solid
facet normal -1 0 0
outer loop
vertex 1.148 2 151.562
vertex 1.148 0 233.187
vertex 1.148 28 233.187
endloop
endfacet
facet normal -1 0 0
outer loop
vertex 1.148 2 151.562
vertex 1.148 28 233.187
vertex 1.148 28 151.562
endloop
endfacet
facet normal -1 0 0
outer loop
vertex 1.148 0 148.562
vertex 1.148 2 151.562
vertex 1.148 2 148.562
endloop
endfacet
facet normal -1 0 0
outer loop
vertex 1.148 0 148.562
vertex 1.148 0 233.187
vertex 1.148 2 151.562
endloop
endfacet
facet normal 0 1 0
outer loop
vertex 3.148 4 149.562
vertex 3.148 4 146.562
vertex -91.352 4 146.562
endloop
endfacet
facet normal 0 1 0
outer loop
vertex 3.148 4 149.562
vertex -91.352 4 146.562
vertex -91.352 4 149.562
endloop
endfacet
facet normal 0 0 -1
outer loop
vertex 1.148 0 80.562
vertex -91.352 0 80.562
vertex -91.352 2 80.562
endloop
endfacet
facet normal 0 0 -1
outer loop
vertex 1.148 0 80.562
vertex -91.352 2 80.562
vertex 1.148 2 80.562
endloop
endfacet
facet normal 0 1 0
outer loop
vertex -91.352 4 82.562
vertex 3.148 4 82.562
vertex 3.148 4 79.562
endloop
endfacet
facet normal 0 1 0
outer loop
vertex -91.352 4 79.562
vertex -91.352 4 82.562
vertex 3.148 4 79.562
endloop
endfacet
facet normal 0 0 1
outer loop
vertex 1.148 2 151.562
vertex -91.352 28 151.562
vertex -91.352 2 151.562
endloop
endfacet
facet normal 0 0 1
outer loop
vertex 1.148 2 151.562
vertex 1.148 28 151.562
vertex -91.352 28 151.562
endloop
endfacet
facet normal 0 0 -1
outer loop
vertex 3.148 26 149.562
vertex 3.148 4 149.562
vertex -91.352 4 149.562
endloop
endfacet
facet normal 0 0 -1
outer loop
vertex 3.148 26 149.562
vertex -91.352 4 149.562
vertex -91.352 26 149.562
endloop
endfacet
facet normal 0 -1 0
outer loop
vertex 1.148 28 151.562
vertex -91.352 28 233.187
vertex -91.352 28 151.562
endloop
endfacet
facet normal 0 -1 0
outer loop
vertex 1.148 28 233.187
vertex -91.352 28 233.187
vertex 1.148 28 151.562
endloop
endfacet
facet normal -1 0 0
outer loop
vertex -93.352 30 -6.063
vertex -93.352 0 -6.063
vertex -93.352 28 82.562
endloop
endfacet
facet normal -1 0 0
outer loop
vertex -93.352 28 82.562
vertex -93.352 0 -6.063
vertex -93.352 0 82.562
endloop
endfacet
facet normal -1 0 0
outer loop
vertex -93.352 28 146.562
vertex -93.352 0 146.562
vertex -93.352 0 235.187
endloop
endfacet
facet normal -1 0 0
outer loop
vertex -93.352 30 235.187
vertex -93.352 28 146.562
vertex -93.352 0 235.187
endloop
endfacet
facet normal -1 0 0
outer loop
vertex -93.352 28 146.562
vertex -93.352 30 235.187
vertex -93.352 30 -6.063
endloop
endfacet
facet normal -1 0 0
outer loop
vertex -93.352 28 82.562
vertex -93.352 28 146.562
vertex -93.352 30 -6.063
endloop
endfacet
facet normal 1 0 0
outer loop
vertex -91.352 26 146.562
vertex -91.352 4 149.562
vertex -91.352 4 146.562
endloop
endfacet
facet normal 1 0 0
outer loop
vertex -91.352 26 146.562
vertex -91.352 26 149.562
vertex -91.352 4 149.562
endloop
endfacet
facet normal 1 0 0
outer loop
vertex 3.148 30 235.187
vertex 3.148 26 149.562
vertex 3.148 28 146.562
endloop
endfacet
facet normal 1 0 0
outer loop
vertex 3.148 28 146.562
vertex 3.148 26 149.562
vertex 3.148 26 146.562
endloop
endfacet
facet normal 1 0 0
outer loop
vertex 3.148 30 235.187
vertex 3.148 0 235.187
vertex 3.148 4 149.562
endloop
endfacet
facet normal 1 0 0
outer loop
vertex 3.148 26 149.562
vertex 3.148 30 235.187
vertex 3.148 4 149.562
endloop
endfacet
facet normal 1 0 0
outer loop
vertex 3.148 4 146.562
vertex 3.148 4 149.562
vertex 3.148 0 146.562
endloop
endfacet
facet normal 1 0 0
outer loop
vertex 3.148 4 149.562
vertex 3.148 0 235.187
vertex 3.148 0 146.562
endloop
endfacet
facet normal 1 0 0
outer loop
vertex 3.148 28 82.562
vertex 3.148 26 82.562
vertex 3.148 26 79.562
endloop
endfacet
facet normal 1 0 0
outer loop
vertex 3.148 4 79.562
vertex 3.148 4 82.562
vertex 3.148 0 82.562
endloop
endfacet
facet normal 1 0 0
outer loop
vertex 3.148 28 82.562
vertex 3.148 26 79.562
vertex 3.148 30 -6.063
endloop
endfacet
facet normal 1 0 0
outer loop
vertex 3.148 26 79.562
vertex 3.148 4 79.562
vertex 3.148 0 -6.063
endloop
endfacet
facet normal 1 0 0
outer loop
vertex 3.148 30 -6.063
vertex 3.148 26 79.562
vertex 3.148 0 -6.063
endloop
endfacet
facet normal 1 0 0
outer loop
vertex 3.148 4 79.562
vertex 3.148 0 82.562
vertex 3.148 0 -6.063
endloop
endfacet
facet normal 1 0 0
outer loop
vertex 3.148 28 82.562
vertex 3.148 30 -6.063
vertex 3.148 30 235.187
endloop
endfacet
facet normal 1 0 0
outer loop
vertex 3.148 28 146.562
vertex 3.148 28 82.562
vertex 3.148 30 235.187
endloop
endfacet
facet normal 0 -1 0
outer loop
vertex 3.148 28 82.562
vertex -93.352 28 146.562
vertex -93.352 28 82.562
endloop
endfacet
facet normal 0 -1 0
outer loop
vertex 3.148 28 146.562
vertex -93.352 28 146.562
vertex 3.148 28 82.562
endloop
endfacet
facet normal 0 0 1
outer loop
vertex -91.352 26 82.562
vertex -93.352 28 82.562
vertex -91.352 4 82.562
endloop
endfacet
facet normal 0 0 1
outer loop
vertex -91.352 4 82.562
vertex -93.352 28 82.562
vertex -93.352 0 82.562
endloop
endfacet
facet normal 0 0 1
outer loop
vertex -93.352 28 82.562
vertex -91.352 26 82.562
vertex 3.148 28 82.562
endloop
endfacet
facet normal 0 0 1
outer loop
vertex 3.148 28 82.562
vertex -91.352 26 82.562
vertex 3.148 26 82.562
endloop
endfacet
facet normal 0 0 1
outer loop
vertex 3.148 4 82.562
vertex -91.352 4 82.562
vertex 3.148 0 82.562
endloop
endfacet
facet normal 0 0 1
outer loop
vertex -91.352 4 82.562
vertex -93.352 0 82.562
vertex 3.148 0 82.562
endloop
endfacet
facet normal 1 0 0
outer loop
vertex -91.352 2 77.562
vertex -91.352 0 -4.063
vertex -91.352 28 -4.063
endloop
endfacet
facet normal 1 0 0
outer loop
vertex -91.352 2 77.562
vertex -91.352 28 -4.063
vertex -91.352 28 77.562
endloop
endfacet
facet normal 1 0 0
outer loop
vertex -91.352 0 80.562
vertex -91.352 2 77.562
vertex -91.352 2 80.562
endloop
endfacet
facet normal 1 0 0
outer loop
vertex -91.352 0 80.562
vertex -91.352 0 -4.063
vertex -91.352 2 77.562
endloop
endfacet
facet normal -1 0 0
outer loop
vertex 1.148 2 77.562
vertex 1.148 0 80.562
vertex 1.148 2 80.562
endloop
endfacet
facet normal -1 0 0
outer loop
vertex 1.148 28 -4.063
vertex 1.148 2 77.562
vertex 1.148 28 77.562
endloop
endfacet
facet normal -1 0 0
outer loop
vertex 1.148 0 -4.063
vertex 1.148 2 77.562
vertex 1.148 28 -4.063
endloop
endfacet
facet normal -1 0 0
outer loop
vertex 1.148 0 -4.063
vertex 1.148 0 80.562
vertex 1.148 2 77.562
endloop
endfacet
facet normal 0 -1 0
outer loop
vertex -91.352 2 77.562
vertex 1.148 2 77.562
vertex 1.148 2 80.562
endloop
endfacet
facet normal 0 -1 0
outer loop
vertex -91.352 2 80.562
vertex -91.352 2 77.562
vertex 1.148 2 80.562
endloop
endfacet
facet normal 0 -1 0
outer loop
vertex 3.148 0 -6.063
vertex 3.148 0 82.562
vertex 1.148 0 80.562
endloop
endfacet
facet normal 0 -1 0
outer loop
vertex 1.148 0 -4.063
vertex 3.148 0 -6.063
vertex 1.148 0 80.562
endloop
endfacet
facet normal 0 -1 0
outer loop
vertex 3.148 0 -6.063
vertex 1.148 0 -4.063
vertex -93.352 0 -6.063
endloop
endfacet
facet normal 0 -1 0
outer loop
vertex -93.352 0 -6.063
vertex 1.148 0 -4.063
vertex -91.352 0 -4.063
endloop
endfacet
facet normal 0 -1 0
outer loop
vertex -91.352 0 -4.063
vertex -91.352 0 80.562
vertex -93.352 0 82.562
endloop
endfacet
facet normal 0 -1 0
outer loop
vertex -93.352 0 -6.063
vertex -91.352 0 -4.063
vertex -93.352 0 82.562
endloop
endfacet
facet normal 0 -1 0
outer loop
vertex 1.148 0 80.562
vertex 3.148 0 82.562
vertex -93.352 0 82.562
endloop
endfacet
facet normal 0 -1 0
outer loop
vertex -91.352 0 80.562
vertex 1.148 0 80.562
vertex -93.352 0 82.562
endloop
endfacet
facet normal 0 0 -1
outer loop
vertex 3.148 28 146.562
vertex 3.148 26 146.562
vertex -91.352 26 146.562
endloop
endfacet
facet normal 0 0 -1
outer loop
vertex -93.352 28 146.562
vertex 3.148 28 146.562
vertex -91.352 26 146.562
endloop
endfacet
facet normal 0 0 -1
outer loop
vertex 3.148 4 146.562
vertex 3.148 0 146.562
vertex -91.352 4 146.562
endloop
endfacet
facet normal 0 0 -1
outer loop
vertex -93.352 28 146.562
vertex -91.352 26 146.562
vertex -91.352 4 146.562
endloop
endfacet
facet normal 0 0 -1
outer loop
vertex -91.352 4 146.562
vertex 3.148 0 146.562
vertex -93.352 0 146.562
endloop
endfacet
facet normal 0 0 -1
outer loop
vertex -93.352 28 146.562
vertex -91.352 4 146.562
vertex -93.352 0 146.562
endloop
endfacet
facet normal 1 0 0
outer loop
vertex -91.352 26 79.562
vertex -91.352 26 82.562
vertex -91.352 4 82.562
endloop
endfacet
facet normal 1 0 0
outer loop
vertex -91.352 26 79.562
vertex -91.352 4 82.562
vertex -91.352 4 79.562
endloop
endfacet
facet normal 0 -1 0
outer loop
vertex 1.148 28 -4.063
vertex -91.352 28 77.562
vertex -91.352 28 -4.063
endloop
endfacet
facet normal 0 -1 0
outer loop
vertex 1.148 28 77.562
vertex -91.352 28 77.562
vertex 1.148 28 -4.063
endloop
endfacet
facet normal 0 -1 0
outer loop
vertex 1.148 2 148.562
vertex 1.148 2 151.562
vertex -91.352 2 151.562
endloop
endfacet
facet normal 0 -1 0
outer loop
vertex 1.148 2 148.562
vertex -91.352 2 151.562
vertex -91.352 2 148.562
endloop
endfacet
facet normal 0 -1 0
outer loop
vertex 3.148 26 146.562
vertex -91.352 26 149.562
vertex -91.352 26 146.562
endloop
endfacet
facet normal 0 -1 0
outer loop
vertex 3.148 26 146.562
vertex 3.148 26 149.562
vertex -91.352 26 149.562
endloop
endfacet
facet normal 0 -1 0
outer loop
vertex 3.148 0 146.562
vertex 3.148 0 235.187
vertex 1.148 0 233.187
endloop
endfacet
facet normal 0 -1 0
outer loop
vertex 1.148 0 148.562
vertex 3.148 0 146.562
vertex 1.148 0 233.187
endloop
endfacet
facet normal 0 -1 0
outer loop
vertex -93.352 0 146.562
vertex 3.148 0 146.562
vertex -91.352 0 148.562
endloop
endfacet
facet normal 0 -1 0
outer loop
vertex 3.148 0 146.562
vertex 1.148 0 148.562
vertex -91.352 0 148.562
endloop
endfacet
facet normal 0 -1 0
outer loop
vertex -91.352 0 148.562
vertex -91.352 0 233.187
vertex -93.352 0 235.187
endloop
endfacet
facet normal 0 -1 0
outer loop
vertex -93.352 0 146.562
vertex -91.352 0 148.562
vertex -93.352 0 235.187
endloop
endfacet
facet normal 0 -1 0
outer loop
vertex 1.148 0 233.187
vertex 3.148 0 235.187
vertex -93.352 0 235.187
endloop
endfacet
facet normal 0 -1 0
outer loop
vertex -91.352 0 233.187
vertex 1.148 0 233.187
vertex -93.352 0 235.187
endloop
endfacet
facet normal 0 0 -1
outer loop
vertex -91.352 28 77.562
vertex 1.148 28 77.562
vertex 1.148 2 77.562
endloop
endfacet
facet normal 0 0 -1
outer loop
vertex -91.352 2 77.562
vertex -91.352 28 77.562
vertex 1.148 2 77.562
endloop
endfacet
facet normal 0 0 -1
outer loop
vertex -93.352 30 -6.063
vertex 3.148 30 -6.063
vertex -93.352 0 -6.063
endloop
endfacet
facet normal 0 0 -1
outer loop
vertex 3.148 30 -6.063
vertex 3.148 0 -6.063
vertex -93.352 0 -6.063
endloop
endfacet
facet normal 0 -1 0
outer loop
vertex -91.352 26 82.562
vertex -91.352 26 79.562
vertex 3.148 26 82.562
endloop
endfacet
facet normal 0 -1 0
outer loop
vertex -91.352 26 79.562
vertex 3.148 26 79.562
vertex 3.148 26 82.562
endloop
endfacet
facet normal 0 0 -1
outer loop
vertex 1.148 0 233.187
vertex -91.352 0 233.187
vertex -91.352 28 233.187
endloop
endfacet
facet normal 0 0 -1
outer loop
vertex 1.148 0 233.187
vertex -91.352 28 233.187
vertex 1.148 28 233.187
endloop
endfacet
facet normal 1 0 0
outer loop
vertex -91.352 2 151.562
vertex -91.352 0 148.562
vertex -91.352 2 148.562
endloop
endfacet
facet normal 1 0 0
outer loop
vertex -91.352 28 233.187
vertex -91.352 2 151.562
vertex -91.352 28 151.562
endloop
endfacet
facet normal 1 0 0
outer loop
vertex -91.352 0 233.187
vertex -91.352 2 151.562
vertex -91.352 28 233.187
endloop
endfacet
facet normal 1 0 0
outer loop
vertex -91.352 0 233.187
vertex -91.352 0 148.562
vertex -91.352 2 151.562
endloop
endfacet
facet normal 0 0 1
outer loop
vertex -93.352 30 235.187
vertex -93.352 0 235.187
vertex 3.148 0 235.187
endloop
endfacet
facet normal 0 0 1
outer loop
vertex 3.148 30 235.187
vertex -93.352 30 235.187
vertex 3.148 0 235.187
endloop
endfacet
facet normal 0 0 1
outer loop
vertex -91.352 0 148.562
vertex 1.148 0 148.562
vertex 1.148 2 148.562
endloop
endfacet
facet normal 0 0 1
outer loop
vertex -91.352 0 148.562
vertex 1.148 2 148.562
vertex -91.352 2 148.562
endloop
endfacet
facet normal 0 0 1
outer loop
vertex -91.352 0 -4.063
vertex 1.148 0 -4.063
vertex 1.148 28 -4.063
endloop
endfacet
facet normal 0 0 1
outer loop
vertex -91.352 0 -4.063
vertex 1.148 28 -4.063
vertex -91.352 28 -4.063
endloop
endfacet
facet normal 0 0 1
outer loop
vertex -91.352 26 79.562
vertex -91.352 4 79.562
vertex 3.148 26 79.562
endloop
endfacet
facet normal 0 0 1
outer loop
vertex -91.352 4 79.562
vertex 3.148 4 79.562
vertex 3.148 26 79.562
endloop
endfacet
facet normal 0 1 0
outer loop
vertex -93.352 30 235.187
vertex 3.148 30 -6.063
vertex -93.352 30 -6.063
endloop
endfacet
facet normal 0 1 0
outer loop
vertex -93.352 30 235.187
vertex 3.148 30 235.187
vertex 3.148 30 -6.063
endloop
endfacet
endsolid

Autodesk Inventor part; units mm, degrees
sketch "Sketch1" plane through (0, 0, 0) normal (0, 1, 0) x (-1, 0, 0)
  point P0 (0, 0)
sketch "Sketch2" plane through (0, 0, 0) normal (0, 1, 0) x (-1, 0, 0)
  point P0 (0, 0)
sketch "Sketch3" plane through (0, 0, 0) normal (0, 1, 0) x (-1, 0, 0)
  line L0 (93.3518, 235.1866) -> (-3.1482, 235.1866)
  line L1 (-3.1482, 235.1866) -> (-3.1482, -6.0634)
  line L2 (-3.1482, -6.0634) -> (93.3518, -6.0634)
  line L3 (93.3518, -6.0634) -> (93.3518, 235.1866)
  point P0 (0, 0)
  dimension "d0" = 241.25
  dimension "d1" = 96.5
extrude "Extrusion1" add sketch "Sketch3" along normal blind 30
sketch "Sketch4" plane through (0, 0, 0) normal (0, -1, 0) x (1, 0, 0)
  line L0 (-93.3518, -6.0634) -> (-93.3518, 235.1866) projected
  line L1 (-93.3518, 82.5616) -> (3.1482, 82.5616)
  line L2 (3.1482, 82.5616) -> (3.1482, 146.5616)
  line L3 (3.1482, 146.5616) -> (-93.3518, 146.5616)
  line L4 (-93.3518, 146.5616) -> (-93.3518, 82.5616)
  point P0 (0, 0)
  point P1 (-93.3518, 114.5616)
  point P2 (-93.3518, 114.5616)
  dimension "d4" = 64
  dimension "d5" = 0
  dimension "d6" = 96.5
  dimension "d7" = 0
extrude "Extrusion2" cut sketch "Sketch4" against normal blind 28
sketch "Sketch5" plane through (0, 0, 0) normal (0, -1, 0) x (1, 0, 0)
  line L0 (3.1482, 82.5616) -> (-93.3518, 82.5616) projected
  line L1 (-93.3518, -6.0634) -> (-93.3518, 82.5616) projected
  line L2 (3.1482, -6.0634) -> (-93.3518, -6.0634) projected
  line L3 (3.1482, 82.5616) -> (3.1482, -6.0634) projected
  line L4 (-93.3518, 146.5616) -> (3.1482, 146.5616) projected
  line L5 (3.1482, 235.1866) -> (3.1482, 146.5616) projected
  line L6 (-93.3518, 235.1866) -> (3.1482, 235.1866) projected
  line L7 (-93.3518, 146.5616) -> (-93.3518, 235.1866) projected
  line L8 (-91.3518, 80.5616) -> (1.1482, 80.5616)
  line L9 (1.1482, 80.5616) -> (1.1482, -4.0634)
  line L10 (1.1482, -4.0634) -> (-91.3518, -4.0634)
  line L11 (-91.3518, -4.0634) -> (-91.3518, 80.5616)
  line L12 (-91.3518, 233.1866) -> (1.1482, 233.1866)
  line L13 (1.1482, 233.1866) -> (1.1482, 148.5616)
  line L14 (1.1482, 148.5616) -> (-91.3518, 148.5616)
  line L15 (-91.3518, 148.5616) -> (-91.3518, 233.1866)
  point P0 (0, 0)
  dimension "d10" = 2
  dimension "d11" = 2
extrude "Extrusion3" cut sketch "Sketch5" against normal blind 28 contours L8 L9 L10 L11 | L12 L13 L14 L15
sketch "Sketch6" plane through (-93.3518, 0, 235.1866) normal (-1, 0, 0) x (0, 0, 1)
  point P0 (-235.1866, 0)
  point P1 (-196.9375, 14)
sketch "Sketch7" plane through (-91.3518, 0, 148.5616) normal (0, 0, 1) x (1, 0, 0)
  line L0 (92.5, 0) -> (0, 0) projected
  line L1 (92.5, 0) -> (92.5, 28) projected
  line L2 (92.5, 28) -> (0, 28) projected
  line L3 (0, 0) -> (0, 28) projected
  point P0 (91.3518, 0)
sketch "Sketch9" plane through (3.1482, 0, -6.0634) normal (1, 0, 0) x (0, 0, -1)
  line L0 (-152.625, 28) -> (-152.625, 26)
  line L1 (-152.625, 0) -> (-152.625, 28) projected
  line L2 (-152.625, 0) -> (-152.625, 4)
  line L3 (-152.625, 4) -> (-155.625, 4)
  line L4 (-155.625, 4) -> (-155.625, 26)
  line L5 (-155.625, 26) -> (-152.625, 26)
  line L6 (-152.625, 26) -> (-152.625, 4)
  line L7 (-88.625, 28) -> (-152.625, 28) projected
  line L8 (-120.625, 28) -> (-120.625, 0)
  line L9 (-88.625, 0) -> (-88.625, 28)
  line L10 (-88.625, 4) -> (-85.625, 4)
  line L11 (-85.625, 4) -> (-85.625, 26)
  line L12 (-85.625, 26) -> (-88.625, 26)
  line L13 (-88.625, 26) -> (-88.625, 4)
  line L14 (-152.625, 28) -> (-157.625, 28)
  line L15 (-157.625, 28) -> (-157.625, 2)
  line L16 (-157.625, 2) -> (-152.625, 2)
  line L17 (-88.625, 28) -> (-83.625, 28)
  line L18 (-83.625, 28) -> (-83.625, 2)
  line L19 (-83.625, 2) -> (-88.625, 2)
  line L20 (-152.625, 26) -> (-152.625, 28)
  line L21 (-154.625, 0) -> (-154.625, 28) projected
  line L22 (-152.625, 2) -> (-152.625, 4)
  line L23 (-152.625, 26) -> (-152.625, 4)
  line L24 (-88.625, 2) -> (-88.625, 4)
  line L25 (-88.625, 0) -> (-88.625, 28) projected
  line L26 (-88.625, 4) -> (-88.625, 26)
  line L27 (-88.625, 28) -> (-88.625, 26)
  point P0 (-6.0634, 0)
  dimension "d28" = 2
  dimension "d29" = 4
  dimension "d30" = 3
  dimension "d31" = 2
  dimension "d36" = 22
  dimension "d37" = 2
  dimension "d38" = 5
extrude "Extrusion5" add sketch "Sketch9" against normal up to surface (96.5 mm away) contours L17 L18 L19 L9 L10 L11 L12 | L0 L5 L21 L14 | L21 L5 L4 L3 L16 L15 L14 | L1 L16 L21 L3
extrude "Extrusion6" cut sketch "Sketch9" against normal blind 94.5 contours L1 L3 L21 L5 | L21 L3 L4 L5 | L12 L11 L10 L9
sketch "Sketch11" plane through (3.1482, 4, 149.5616) normal (0, 0, -1) x (-1, 0, 0)
  point P0 (3.1482, -4)
properties part number "kontroller"
